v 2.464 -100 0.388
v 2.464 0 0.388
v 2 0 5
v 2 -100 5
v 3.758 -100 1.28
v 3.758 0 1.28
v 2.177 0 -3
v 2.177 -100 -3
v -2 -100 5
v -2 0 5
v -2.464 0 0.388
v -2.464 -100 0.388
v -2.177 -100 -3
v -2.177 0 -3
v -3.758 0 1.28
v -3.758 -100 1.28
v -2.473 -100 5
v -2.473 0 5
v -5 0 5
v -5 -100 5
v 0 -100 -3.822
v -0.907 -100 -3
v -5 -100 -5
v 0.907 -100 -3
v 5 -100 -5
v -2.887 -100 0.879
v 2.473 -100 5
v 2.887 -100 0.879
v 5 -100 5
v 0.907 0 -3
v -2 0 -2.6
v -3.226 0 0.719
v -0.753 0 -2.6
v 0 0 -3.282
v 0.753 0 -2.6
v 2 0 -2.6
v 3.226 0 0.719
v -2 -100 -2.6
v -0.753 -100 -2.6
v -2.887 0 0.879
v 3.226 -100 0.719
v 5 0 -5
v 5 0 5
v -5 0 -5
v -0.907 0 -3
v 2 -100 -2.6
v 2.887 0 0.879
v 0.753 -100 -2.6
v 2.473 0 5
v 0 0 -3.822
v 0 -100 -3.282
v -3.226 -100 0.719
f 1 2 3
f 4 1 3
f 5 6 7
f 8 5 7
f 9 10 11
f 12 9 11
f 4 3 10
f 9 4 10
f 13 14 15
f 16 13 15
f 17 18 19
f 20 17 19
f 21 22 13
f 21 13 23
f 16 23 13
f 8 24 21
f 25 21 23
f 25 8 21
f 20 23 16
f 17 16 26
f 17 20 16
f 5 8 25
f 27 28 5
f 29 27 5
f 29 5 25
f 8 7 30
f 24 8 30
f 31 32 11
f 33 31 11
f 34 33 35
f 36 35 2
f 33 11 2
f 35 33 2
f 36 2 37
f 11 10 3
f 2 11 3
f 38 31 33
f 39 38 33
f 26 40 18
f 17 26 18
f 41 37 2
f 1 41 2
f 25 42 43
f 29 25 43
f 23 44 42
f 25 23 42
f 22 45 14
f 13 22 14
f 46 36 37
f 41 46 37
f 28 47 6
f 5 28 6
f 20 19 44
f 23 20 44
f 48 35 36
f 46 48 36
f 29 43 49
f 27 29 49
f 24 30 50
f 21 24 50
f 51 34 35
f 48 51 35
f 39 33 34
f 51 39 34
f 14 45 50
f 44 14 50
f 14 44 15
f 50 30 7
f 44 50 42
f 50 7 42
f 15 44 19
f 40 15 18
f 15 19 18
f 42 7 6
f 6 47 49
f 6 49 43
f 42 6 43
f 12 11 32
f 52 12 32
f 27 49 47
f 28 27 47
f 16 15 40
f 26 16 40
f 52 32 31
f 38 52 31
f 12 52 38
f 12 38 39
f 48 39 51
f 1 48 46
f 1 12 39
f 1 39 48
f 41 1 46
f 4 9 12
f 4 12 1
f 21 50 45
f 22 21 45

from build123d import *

# Parameters (mm, degrees)
F1_DEPTH = 100
F2_DEPTH = 100


with BuildPart() as f1:
    # F0 (on Front) → F1 (new body)
    with BuildSketch(Plane.XZ):
        Polygon((-5, -5), (5, -5), (5, -1.523607), (5, 5), (3, 5), (2.47285, 5), (2.887205, 0.878801), (3.757917, 1.279605), (2.177033, -3), (0.906944, -3), (0, -3.821989), (-0.906944, -3), (-2.177033, -3), (-3.757917, 1.279605), (-2.887205, 0.878801), (-2.47285, 5), (-3, 5), (-5, 5), align=None)
    extrude(amount=F1_DEPTH)


with BuildPart() as f2:
    # F0 (on Front) → F2 (new body)
    with BuildSketch(Plane.XZ):
        Polygon((0, 5), (-2, 5), (-2.463702, 0.387995), (-3.22613, 0.719253), (-2, -2.6), (-0.752649, -2.6), (0, -3.282147), (0.752649, -2.6), (2, -2.6), (3.22613, 0.719253), (2.463702, 0.387995), (2, 5), align=None)
    extrude(amount=F2_DEPTH)


solid = Compound([f1.part, f2.part])
